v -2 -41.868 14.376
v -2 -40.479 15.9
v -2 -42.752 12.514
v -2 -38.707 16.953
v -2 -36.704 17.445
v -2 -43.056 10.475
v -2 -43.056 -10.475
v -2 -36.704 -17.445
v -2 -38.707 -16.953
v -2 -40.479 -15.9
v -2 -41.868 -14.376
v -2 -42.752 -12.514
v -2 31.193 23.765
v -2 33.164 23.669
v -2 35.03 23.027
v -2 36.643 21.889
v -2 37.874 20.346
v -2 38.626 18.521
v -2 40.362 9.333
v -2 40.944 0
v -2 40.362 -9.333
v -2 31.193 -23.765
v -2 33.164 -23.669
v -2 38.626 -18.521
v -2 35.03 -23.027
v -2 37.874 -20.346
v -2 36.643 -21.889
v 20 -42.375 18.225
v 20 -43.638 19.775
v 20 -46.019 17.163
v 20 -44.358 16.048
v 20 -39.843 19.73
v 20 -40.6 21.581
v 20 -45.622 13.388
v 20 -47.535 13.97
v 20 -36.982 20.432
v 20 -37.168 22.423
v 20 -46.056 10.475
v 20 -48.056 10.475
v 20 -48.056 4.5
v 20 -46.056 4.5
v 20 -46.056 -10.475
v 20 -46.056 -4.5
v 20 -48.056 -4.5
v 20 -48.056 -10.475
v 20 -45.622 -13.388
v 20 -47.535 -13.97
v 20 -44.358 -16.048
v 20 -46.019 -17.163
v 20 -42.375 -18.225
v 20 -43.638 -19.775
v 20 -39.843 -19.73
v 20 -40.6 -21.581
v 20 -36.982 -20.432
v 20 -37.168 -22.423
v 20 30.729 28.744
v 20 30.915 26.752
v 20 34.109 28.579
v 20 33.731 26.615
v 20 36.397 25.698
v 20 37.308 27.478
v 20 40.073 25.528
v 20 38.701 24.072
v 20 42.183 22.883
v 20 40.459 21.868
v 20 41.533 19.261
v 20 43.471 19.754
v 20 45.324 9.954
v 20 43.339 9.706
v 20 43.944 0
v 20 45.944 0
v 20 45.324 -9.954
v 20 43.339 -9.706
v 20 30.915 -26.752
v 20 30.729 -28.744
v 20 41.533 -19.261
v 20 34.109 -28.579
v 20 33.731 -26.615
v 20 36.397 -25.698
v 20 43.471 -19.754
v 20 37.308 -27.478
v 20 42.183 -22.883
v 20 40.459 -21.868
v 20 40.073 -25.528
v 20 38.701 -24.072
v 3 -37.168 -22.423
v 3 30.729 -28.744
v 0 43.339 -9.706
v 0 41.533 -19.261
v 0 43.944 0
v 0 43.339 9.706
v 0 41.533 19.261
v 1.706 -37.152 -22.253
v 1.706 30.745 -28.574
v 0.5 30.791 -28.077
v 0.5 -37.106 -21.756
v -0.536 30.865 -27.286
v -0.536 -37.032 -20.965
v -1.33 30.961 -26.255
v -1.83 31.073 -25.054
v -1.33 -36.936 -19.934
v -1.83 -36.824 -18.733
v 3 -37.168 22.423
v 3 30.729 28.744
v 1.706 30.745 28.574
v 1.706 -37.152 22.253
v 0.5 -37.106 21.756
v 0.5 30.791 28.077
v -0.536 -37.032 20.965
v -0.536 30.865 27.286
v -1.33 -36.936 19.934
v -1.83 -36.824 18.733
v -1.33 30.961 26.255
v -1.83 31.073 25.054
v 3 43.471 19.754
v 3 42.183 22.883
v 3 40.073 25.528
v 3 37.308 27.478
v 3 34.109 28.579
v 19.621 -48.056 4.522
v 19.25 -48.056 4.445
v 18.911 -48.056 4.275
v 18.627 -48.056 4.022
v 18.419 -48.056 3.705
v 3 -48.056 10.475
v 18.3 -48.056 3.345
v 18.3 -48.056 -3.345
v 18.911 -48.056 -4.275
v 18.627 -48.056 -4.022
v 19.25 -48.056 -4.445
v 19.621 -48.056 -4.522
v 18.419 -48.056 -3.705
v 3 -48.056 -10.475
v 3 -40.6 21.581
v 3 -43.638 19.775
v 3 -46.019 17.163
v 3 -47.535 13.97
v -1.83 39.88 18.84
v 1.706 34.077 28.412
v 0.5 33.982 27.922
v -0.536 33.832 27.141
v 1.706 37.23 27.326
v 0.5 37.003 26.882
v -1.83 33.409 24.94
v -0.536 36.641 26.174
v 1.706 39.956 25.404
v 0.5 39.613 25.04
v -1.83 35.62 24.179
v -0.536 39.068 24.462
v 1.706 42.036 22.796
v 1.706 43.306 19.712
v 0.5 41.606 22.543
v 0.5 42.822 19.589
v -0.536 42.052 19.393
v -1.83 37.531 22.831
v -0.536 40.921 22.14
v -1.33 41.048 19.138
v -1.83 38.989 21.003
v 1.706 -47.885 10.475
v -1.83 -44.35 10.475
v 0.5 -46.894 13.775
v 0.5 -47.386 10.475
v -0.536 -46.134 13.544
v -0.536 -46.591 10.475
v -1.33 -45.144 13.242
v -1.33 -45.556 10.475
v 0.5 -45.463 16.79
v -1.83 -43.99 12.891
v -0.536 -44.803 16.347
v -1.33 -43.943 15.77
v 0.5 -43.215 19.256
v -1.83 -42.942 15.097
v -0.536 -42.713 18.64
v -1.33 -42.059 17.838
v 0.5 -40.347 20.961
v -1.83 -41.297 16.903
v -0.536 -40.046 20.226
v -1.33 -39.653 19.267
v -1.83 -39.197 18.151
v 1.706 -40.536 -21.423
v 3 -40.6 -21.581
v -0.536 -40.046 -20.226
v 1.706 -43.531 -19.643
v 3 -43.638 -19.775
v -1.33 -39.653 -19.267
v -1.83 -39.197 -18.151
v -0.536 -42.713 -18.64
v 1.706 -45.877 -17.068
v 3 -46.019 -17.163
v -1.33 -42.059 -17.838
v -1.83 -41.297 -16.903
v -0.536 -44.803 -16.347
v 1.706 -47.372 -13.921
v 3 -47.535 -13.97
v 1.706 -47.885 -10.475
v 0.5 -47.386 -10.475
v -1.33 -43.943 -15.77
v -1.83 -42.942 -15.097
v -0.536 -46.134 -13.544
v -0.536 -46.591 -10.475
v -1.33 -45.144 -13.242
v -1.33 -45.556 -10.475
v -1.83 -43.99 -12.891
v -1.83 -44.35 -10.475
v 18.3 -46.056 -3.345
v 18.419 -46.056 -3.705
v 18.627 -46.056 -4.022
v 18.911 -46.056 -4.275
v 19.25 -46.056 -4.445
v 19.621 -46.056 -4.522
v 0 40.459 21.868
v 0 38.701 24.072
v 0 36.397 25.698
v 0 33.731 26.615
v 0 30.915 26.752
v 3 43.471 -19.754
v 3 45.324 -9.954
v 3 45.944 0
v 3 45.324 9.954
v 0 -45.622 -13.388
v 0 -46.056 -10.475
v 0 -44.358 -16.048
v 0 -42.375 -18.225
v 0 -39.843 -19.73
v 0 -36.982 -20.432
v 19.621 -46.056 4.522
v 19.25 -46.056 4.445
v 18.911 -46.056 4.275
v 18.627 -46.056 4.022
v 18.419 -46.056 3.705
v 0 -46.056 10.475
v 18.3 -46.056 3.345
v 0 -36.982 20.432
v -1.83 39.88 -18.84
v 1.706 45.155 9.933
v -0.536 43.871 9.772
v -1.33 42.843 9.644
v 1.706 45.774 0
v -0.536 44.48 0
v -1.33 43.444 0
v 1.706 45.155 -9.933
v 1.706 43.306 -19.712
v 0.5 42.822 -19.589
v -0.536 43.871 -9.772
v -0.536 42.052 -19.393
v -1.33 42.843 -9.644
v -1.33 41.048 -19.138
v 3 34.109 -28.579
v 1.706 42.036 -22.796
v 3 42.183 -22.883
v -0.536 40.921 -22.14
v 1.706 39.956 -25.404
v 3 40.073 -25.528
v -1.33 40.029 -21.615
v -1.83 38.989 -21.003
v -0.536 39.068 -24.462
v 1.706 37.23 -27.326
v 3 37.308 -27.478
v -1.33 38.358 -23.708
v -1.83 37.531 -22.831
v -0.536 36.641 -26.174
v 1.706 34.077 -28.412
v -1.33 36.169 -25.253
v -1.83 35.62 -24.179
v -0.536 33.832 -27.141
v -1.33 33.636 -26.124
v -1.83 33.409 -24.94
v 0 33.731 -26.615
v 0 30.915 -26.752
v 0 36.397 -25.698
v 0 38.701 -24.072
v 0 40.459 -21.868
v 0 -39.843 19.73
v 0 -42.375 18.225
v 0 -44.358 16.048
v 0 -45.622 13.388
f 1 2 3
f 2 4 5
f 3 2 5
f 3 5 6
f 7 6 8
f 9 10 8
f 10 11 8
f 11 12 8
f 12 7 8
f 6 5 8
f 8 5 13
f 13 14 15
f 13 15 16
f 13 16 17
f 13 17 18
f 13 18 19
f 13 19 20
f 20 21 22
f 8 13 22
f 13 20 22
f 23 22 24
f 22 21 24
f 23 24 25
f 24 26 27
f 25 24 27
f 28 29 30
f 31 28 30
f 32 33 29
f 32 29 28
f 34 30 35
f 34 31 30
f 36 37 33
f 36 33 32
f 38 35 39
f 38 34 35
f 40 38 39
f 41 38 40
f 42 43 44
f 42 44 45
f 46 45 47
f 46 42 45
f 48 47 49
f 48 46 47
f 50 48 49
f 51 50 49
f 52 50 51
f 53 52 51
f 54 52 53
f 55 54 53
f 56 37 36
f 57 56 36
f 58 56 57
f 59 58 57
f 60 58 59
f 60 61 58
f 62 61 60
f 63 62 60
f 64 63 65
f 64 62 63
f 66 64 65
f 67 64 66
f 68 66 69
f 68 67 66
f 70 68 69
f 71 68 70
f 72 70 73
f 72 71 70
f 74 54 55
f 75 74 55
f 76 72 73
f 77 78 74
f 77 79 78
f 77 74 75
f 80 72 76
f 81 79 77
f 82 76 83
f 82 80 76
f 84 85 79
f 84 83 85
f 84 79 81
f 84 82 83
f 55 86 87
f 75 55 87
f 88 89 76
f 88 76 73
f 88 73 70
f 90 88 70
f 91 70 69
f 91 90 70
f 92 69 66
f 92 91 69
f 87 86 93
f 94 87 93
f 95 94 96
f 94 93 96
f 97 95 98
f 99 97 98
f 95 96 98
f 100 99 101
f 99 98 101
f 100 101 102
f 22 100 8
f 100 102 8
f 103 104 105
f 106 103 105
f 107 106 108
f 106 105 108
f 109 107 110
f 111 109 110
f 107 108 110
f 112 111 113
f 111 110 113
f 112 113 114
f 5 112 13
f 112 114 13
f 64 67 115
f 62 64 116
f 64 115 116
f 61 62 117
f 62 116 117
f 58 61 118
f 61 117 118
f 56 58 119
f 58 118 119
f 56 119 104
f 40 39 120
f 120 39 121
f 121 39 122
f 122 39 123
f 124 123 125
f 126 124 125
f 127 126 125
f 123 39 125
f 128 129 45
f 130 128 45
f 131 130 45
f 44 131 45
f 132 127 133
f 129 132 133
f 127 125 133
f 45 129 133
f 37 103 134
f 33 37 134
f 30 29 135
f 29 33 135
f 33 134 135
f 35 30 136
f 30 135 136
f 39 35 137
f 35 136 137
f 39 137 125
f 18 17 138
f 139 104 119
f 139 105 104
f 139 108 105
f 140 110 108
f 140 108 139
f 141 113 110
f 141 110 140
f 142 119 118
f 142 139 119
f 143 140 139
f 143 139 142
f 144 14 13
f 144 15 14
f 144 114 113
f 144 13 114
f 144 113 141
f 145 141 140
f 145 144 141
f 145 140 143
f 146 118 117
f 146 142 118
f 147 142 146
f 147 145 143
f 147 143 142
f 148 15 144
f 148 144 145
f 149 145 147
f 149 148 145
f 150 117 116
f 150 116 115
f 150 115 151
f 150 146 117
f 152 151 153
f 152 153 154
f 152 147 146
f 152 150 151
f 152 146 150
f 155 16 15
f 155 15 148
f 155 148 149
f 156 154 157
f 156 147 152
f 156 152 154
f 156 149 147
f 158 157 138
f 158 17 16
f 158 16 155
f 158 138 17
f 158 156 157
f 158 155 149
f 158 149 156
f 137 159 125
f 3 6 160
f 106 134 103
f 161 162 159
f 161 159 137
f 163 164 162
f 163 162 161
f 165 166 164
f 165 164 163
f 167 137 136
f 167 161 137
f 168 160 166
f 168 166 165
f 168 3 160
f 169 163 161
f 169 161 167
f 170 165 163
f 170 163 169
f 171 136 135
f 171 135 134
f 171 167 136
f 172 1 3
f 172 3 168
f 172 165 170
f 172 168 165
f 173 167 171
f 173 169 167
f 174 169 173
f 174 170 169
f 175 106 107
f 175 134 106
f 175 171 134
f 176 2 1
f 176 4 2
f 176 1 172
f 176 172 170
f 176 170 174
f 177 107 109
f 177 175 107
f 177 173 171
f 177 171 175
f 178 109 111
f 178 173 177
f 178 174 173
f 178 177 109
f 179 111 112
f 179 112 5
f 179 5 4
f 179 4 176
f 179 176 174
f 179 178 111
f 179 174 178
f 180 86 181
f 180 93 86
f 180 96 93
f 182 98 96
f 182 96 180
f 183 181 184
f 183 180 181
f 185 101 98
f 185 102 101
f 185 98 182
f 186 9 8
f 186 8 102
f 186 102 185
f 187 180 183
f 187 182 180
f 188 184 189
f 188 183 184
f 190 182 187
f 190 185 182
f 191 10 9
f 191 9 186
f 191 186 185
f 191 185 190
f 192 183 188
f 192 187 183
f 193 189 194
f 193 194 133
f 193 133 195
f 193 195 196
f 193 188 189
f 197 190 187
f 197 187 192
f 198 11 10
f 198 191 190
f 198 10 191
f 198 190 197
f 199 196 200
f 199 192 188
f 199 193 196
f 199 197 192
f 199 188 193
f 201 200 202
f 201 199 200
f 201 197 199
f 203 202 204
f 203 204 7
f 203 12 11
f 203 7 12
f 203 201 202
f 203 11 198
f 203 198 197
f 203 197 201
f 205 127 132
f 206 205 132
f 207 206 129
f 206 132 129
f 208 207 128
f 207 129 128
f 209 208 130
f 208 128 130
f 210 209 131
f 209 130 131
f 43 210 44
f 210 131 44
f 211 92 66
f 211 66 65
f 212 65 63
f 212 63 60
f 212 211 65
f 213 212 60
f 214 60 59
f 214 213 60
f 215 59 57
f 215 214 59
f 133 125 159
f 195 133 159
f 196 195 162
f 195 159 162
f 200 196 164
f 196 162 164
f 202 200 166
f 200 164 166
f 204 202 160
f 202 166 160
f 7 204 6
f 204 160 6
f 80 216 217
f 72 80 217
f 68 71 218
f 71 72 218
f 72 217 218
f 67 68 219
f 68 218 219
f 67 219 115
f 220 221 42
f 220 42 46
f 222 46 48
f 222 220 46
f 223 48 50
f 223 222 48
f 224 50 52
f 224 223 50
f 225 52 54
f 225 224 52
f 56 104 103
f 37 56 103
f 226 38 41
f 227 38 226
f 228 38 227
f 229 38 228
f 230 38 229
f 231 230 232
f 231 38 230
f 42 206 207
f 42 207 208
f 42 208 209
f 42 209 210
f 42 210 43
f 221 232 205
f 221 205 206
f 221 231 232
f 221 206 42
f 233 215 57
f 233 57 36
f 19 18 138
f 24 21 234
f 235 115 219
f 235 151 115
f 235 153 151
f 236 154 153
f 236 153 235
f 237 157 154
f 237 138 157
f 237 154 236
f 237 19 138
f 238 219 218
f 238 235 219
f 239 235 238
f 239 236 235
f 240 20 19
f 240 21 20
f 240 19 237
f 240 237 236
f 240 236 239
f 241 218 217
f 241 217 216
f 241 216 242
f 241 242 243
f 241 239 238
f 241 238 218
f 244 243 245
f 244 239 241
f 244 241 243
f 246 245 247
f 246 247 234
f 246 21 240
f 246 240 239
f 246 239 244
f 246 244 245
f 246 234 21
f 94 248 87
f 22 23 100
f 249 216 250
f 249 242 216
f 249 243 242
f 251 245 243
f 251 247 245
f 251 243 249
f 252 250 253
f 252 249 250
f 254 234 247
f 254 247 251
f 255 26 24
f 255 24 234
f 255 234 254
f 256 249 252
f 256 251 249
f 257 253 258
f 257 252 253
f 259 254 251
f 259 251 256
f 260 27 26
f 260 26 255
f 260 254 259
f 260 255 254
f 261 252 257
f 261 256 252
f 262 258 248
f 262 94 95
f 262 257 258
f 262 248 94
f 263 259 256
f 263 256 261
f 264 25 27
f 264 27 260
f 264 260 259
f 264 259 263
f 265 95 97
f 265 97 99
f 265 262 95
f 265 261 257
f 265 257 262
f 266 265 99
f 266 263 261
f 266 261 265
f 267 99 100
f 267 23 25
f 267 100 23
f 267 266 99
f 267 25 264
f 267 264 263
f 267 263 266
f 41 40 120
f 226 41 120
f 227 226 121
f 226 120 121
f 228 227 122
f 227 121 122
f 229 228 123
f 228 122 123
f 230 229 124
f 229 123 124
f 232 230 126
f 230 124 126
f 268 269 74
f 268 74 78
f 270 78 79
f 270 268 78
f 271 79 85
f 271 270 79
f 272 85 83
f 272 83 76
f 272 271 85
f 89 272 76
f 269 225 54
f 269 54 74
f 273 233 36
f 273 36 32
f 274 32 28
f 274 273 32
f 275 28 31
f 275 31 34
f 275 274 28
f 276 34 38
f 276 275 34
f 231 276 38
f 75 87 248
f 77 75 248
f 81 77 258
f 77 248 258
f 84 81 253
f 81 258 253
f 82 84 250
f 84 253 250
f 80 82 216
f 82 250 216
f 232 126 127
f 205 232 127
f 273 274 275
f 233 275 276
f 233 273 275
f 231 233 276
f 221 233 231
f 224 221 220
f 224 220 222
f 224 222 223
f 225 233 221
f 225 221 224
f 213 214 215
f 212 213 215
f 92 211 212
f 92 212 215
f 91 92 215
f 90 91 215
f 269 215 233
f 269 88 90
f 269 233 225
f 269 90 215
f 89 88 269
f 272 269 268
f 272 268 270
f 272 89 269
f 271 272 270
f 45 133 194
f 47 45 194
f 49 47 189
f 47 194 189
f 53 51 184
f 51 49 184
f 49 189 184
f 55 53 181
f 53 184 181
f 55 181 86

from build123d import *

# Parameters (mm, degrees)
BOSS_EXTRUDE1_DEPTH = 20
SHELL4_T            = 2
FILLET2_R           = 5
CUT_EXTRUDE1_DEPTH  = 2


with BuildPart() as part:
    # Sketch2 → Boss-Extrude1 (new body)
    with BuildSketch(Plane(origin=(0, 0, 0), x_dir=(0, 0, -1), z_dir=(1, 0, 0))):
        with BuildLine():
            Line((-26.752483981, 30.914680653), (-20.431723376, -36.982479222))
            ThreePointArc((-20.431723376, -36.982479222), (-17.210158239, -43.447078966), (-10.474775424, -46.055555556))
            Line((-10.474775424, -46.055555556), (10.474775424, -46.055555556))
            ThreePointArc((10.474775424, -46.055555556), (17.210158239, -43.447078966), (20.431723376, -36.982479222))
            Line((20.431723376, -36.982479222), (26.752483981, 30.914680653))
            ThreePointArc((26.752483981, 30.914680653), (24.966551173, 37.606542438), (19.260935813, 41.532930539))
            ThreePointArc((19.260935813, 41.532930539), (0, 43.944444444), (-19.260935813, 41.532930539))
            ThreePointArc((-19.260935813, 41.532930539), (-24.966551173, 37.606542438), (-26.752483981, 30.914680653))
        make_face()
    extrude(amount=BOSS_EXTRUDE1_DEPTH)

    # Shell4
    shell4_openings = [part.faces().sort_by_distance(p)[0] for p in [
        (20, 0.813945533, 0),
    ]]
    offset(amount=SHELL4_T, openings=shell4_openings, kind=Kind.INTERSECTION)

    # Fillet2
    # the kernel refuses this fillet: 5 mm, written as the material it takes off along each edge
    with BuildSketch(Plane(origin=(-2, -48.055555556, 10.474775424), x_dir=(1, 0, 0), z_dir=(0, 0, -1))) as fillet2_piece_1:
        with BuildLine():
            CenterArc((FILLET2_R, -FILLET2_R), FILLET2_R, 90, 90)
            Line((0, -FILLET2_R), (0, 0))
            Line((0, 0), (FILLET2_R, 0))
        make_face()
    extrude(amount=20.949550847, mode=Mode.SUBTRACT)
    with BuildSketch(Plane(origin=(-2, -36.055555556, 10.474775424), x_dir=(0, -1, 0), z_dir=(0, 0, -1))) as fillet2_piece_2:
        with BuildLine():
            CenterArc((12 - FILLET2_R, -FILLET2_R), FILLET2_R, 0, 90)
            Line((12 - FILLET2_R, 0), (12, 0))
            Line((12, 0), (12, -FILLET2_R))
        make_face()
    revolve(axis=Axis((-2, -36.055555556, 10.474775424), (-1, 0, 0)), revolution_arc=84.681483972, mode=Mode.SUBTRACT)
    with BuildSketch(Plane(origin=(-2, 30.729295919, 28.743873571), x_dir=(1, 0, 0), z_dir=(0, -0.9956947951896508, -0.09269236663414848)), Plane(origin=(-2, -37.167863955, -22.423112966), x_dir=(1, 0, 0), z_dir=(0, 0.9956947951896508, -0.09269236663414848))) as fillet2_piece_3:
        with BuildLine():
            CenterArc((FILLET2_R, -FILLET2_R), FILLET2_R, 90, 90)
            Line((0, -FILLET2_R), (0, 0))
            Line((0, 0), (FILLET2_R, 0))
        make_face()
    extrude(amount=68.190734955, mode=Mode.SUBTRACT)
    with BuildSketch(Plane(origin=(-2, 31.841604319, 16.795536029), x_dir=(0, -0.09269236663414838, 0.9956947951896509), z_dir=(0, -0.9956947951896509, -0.09269236663414838))) as fillet2_piece_4:
        with BuildLine():
            CenterArc((12 - FILLET2_R, -FILLET2_R), FILLET2_R, 0, 90)
            Line((12 - FILLET2_R, 0), (12, 0))
            Line((12, 0), (12, -FILLET2_R))
        make_face()
    revolve(axis=Axis((-2, 31.841604319, 16.795536029), (-1, 0, 0)), revolution_arc=81.045656085, mode=Mode.SUBTRACT)
    with BuildSketch(Plane(origin=(-2, -34.180555556, 0), x_dir=(0, 0.9691326220109027, 0.2465399784097355), z_dir=(0, -0.2465399784097355, 0.9691326220109027))) as fillet2_piece_5:
        with BuildLine():
            CenterArc((80.125 - FILLET2_R, -FILLET2_R), FILLET2_R, 0, 90)
            Line((80.125 - FILLET2_R, 0), (80.125, 0))
            Line((80.125, 0), (80.125, -FILLET2_R))
        make_face()
    revolve(axis=Axis((-2, -34.180555556, 0), (-1, 0, 0)), revolution_arc=28.545719886, mode=Mode.SUBTRACT)
    with BuildSketch(Plane(origin=(-2, 31.841604319, -16.795536029), x_dir=(0, 0.9691326220109029, -0.24653997840973443), z_dir=(0, 0.24653997840973443, 0.9691326220109029))) as fillet2_piece_6:
        with BuildLine():
            CenterArc((12 - FILLET2_R, -FILLET2_R), FILLET2_R, 0, 90)
            Line((12 - FILLET2_R, 0), (12, 0))
            Line((12, 0), (12, -FILLET2_R))
        make_face()
    revolve(axis=Axis((-2, 31.841604319, -16.795536029), (-1, 0, 0)), revolution_arc=81.045656085, mode=Mode.SUBTRACT)
    with BuildSketch(Plane(origin=(-2, -36.055555556, -10.474775424), x_dir=(0, -0.09269236663414783, -0.9956947951896509), z_dir=(0, 0.9956947951896509, -0.09269236663414783))) as fillet2_piece_7:
        with BuildLine():
            CenterArc((12 - FILLET2_R, -FILLET2_R), FILLET2_R, 0, 90)
            Line((12 - FILLET2_R, 0), (12, 0))
            Line((12, 0), (12, -FILLET2_R))
        make_face()
    revolve(axis=Axis((-2, -36.055555556, -10.474775424), (-1, 0, 0)), revolution_arc=84.681483972, mode=Mode.SUBTRACT)

    # Sketch3 → Cut-Extrude1 (cut)
    with BuildSketch(Plane.XZ.offset(48.055555556)):
        with BuildLine():
            Line((20, -4.5), (20, 4.5))
            ThreePointArc((20, 4.5), (18.910791668, 4.274581528), (18.3, 3.345))
            Line((18.3, 3.345), (18.3, -3.345))
            ThreePointArc((18.3, -3.345), (18.910791668, -4.274581528), (20, -4.5))
        make_face()
    extrude(amount=-CUT_EXTRUDE1_DEPTH, mode=Mode.SUBTRACT)


solid = part.part
